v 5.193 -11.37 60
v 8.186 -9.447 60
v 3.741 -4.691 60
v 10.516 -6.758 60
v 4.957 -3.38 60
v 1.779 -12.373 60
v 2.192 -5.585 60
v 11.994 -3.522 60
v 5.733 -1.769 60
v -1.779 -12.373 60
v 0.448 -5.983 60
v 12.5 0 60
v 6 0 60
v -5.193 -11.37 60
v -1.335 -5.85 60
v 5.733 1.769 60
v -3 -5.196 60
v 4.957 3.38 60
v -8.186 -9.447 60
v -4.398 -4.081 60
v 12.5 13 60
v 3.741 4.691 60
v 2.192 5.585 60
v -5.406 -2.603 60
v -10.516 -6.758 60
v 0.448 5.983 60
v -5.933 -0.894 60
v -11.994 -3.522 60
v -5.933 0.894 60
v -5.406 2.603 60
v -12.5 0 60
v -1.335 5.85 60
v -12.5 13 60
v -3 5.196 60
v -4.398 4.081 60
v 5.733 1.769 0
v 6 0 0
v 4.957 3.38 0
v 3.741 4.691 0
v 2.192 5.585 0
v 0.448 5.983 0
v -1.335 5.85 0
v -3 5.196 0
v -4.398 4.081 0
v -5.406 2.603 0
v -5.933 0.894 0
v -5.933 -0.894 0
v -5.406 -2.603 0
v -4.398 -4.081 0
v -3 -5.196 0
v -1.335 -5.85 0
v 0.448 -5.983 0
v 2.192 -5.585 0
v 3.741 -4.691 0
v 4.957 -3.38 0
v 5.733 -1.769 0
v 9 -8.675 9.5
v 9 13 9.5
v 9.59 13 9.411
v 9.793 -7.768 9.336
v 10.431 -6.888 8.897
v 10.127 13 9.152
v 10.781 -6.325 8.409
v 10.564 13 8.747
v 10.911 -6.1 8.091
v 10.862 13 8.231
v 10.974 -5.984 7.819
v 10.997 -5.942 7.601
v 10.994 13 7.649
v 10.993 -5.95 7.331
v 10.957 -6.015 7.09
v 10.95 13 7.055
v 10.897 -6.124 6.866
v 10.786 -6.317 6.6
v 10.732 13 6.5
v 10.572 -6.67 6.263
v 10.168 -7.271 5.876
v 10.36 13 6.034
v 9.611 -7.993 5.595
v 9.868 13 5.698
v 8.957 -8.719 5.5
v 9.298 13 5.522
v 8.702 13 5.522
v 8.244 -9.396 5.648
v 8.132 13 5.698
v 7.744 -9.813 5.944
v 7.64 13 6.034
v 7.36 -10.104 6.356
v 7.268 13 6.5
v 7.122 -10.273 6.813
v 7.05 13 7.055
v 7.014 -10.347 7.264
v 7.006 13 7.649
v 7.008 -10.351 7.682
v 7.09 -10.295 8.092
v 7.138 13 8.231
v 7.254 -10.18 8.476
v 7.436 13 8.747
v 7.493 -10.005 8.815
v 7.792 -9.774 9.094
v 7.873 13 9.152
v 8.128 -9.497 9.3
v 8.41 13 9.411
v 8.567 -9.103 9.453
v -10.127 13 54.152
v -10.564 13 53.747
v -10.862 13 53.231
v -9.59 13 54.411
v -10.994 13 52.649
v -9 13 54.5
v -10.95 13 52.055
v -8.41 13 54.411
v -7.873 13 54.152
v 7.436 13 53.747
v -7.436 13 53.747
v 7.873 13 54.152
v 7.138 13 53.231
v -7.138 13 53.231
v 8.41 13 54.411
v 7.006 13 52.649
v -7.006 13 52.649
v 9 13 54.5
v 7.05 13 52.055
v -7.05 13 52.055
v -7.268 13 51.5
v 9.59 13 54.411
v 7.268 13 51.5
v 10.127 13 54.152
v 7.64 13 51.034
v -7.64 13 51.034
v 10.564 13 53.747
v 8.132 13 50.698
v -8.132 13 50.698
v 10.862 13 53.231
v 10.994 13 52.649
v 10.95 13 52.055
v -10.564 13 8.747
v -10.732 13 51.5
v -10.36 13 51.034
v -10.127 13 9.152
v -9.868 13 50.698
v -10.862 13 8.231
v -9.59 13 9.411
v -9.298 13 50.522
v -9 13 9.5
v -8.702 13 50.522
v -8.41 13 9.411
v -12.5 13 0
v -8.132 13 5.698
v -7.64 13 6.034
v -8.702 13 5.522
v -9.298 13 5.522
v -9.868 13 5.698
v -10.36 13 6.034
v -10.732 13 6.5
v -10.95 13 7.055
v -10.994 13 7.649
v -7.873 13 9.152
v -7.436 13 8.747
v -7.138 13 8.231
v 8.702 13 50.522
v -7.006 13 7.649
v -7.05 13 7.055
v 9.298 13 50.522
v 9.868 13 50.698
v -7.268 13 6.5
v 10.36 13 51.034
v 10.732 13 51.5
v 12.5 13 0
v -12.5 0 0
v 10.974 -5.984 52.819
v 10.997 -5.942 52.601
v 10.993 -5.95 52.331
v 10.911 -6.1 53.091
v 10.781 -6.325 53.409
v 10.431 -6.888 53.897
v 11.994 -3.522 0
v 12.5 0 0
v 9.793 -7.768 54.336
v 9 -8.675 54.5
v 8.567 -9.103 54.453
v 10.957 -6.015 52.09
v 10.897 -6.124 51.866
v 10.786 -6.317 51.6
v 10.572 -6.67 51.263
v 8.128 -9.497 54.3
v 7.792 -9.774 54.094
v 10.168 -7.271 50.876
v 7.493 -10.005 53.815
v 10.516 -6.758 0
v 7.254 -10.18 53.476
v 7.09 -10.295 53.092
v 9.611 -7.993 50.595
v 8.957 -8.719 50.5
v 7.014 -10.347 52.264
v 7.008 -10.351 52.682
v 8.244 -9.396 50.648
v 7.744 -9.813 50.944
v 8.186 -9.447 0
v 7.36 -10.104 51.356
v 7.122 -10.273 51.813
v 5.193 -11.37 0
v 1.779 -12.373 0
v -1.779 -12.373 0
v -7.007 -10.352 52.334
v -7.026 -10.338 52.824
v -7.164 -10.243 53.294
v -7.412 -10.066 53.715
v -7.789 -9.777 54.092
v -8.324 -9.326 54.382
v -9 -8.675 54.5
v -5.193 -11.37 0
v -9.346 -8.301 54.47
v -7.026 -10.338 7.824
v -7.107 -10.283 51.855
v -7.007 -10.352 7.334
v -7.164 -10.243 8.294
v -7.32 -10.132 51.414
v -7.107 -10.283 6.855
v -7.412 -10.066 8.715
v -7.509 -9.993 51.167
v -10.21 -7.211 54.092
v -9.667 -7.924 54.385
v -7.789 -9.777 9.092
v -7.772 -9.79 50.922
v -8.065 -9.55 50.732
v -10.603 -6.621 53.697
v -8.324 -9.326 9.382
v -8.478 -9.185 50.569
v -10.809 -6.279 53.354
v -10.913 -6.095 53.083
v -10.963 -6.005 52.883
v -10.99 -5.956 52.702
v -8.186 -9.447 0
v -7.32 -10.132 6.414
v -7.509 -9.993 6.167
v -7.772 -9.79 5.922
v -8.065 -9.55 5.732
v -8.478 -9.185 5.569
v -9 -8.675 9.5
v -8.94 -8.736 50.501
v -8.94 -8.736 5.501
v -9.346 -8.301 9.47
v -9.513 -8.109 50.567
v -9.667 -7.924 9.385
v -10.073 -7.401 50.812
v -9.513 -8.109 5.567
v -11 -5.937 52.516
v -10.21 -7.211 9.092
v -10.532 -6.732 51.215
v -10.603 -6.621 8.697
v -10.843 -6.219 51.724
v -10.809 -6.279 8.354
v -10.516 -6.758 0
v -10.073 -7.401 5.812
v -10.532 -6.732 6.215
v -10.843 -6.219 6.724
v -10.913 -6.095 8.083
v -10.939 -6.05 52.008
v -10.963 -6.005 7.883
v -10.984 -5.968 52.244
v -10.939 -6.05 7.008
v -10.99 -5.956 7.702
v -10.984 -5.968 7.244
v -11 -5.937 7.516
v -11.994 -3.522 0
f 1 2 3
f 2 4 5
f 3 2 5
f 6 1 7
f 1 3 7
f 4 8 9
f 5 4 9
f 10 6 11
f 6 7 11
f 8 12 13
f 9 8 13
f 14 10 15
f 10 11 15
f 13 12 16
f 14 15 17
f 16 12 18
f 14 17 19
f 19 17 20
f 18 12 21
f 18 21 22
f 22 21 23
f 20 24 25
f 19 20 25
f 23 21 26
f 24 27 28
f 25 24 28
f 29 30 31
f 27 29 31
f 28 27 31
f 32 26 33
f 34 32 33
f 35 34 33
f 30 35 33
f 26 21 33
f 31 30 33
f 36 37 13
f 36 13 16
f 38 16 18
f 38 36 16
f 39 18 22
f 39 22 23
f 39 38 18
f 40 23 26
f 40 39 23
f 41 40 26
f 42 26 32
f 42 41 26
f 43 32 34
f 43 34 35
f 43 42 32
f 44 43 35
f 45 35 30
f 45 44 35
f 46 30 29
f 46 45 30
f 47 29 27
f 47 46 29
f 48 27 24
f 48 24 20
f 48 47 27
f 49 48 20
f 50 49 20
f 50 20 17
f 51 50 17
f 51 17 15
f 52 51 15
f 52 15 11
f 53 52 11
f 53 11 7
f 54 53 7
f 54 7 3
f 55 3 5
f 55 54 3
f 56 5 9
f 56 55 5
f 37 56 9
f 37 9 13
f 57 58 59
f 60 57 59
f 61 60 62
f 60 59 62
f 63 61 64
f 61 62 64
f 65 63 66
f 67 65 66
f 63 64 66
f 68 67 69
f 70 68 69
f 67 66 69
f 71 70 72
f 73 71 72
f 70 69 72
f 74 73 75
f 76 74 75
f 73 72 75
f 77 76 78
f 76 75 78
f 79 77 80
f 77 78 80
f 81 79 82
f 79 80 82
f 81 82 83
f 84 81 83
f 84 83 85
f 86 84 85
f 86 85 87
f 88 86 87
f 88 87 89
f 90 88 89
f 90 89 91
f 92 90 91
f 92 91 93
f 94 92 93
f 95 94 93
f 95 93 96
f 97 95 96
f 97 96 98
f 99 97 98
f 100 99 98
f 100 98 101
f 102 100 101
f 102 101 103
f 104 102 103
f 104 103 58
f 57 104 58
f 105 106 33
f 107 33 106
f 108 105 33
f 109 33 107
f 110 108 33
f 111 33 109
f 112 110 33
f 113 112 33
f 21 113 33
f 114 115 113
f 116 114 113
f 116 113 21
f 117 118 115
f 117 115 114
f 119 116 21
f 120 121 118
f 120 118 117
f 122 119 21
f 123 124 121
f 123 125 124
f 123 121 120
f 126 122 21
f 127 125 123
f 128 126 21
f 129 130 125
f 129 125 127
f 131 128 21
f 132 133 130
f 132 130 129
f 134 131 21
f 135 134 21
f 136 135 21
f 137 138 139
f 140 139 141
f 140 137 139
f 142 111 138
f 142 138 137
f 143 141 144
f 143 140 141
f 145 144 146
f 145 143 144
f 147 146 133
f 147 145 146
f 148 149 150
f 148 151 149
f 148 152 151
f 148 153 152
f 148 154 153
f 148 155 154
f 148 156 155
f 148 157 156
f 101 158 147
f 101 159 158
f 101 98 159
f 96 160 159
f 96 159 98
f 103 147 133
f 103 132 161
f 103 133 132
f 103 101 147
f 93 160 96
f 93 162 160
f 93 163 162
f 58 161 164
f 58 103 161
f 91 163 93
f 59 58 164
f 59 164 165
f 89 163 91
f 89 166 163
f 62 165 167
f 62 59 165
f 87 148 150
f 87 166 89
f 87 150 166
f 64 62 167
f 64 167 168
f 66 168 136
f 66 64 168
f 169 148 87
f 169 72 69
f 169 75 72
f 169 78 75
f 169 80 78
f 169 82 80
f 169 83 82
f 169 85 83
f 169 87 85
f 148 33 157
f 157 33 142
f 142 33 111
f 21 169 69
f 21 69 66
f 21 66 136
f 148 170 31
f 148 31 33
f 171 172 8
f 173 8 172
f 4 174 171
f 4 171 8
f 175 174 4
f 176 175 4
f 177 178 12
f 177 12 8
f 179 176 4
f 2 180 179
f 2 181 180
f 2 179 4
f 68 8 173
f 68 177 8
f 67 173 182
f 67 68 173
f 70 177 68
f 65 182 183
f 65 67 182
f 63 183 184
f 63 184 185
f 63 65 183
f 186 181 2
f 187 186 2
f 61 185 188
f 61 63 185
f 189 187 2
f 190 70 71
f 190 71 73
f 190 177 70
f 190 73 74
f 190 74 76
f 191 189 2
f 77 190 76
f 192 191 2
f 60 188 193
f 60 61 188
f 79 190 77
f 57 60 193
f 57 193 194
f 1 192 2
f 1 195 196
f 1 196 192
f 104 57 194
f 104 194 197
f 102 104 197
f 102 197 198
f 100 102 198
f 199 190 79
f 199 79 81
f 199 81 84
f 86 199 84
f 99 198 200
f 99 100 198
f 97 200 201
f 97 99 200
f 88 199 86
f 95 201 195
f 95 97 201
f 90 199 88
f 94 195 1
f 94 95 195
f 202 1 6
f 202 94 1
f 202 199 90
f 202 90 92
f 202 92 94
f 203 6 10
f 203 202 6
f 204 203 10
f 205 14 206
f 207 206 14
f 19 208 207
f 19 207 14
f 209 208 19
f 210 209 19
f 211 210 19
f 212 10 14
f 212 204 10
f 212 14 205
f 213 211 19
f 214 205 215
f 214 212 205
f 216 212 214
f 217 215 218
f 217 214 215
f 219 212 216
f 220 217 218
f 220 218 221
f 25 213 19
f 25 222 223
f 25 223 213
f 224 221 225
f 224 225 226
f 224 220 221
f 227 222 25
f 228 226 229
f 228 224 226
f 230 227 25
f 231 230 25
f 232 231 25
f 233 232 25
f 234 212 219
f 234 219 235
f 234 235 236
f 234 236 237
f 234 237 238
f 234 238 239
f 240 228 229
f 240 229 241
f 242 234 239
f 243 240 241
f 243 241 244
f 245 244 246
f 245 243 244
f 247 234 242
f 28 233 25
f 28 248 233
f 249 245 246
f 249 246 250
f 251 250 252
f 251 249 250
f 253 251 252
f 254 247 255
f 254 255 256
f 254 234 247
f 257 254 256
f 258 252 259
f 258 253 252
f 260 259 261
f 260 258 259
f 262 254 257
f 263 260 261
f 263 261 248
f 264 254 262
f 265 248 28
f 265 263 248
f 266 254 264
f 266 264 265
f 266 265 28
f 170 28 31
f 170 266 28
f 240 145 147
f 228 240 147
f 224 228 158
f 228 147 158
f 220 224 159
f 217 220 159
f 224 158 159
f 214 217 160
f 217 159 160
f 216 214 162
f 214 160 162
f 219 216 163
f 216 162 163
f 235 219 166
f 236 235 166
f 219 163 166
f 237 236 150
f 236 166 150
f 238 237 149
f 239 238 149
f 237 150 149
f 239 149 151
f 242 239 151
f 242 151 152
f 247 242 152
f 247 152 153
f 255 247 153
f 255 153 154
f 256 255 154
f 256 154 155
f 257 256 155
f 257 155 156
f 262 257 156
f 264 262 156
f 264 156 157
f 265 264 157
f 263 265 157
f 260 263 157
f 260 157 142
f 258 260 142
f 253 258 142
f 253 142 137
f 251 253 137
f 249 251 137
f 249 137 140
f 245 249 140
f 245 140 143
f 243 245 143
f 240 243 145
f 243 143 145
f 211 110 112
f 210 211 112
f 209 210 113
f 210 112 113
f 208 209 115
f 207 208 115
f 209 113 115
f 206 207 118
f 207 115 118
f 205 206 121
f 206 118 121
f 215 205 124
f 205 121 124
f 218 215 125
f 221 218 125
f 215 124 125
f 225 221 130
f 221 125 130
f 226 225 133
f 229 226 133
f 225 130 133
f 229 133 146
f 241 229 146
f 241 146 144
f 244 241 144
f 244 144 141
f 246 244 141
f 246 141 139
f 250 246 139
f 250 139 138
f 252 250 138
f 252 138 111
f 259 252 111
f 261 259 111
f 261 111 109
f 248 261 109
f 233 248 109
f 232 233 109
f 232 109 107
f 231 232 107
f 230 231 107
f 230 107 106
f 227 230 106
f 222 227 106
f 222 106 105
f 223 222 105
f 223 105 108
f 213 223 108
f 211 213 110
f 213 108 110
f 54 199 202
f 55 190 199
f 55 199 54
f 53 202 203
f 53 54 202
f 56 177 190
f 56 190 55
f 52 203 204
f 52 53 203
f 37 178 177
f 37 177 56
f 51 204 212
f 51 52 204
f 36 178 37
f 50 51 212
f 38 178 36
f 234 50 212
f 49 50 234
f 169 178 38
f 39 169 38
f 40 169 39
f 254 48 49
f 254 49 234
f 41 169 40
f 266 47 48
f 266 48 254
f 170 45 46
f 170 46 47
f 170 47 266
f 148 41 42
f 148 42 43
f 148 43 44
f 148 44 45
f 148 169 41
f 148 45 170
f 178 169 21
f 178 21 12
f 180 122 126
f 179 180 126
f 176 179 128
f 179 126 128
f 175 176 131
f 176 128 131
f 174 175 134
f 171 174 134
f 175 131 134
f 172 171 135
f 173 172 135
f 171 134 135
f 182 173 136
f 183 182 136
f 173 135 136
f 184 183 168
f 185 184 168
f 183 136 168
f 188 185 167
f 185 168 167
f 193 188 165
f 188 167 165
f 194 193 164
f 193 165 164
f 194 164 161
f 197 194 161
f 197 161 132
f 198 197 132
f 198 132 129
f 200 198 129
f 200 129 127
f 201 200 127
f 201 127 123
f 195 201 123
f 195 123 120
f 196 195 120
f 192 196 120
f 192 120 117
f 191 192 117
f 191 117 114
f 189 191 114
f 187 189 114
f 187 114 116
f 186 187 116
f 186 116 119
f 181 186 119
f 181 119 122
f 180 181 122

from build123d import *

# Parameters (mm, degrees)
ESBO_O1_R                = 6
RESSALTO_EXTRUS_O1_DEPTH = 60
ESBO_O3_R                = 2
CORTE_EXTRUS_O1_DEPTH    = 67.381473319


with BuildPart() as part:
    # Esboço1 → Ressalto-extrusão1 (new body)
    with BuildSketch(Plane.XY):
        with BuildLine():
            Line((-12.5, 0), (-12.5, 13))
            Line((-12.5, 13), (12.5, 13))
            Line((12.5, 13), (12.5, 0))
            ThreePointArc((12.5, 0), (0, -12.5), (-12.5, 0))
        make_face()
        Circle(ESBO_O1_R, mode=Mode.SUBTRACT)
    extrude(amount=RESSALTO_EXTRUS_O1_DEPTH)

    # Esboço3 → Corte-extrusão1 (cut, through all)
    with BuildSketch(Plane(origin=(0, 13, 0), x_dir=(1, 0, 0), z_dir=(0, 1, 0))):
        with Locations(Location((-9, -52.5, 0), (0, 0, 270))):
            Circle(ESBO_O3_R)
        with Locations(Location((-9, -7.5, 0), (0, 0, 270))):
            Circle(ESBO_O3_R)
        with Locations(Location((9, -52.5, 0), (0, 0, 270))):
            Circle(ESBO_O3_R)
        with Locations(Location((9, -7.5, 0), (0, 0, 270))):
            Circle(ESBO_O3_R)
    extrude(amount=-CORTE_EXTRUS_O1_DEPTH, mode=Mode.SUBTRACT)


solid = part.part
